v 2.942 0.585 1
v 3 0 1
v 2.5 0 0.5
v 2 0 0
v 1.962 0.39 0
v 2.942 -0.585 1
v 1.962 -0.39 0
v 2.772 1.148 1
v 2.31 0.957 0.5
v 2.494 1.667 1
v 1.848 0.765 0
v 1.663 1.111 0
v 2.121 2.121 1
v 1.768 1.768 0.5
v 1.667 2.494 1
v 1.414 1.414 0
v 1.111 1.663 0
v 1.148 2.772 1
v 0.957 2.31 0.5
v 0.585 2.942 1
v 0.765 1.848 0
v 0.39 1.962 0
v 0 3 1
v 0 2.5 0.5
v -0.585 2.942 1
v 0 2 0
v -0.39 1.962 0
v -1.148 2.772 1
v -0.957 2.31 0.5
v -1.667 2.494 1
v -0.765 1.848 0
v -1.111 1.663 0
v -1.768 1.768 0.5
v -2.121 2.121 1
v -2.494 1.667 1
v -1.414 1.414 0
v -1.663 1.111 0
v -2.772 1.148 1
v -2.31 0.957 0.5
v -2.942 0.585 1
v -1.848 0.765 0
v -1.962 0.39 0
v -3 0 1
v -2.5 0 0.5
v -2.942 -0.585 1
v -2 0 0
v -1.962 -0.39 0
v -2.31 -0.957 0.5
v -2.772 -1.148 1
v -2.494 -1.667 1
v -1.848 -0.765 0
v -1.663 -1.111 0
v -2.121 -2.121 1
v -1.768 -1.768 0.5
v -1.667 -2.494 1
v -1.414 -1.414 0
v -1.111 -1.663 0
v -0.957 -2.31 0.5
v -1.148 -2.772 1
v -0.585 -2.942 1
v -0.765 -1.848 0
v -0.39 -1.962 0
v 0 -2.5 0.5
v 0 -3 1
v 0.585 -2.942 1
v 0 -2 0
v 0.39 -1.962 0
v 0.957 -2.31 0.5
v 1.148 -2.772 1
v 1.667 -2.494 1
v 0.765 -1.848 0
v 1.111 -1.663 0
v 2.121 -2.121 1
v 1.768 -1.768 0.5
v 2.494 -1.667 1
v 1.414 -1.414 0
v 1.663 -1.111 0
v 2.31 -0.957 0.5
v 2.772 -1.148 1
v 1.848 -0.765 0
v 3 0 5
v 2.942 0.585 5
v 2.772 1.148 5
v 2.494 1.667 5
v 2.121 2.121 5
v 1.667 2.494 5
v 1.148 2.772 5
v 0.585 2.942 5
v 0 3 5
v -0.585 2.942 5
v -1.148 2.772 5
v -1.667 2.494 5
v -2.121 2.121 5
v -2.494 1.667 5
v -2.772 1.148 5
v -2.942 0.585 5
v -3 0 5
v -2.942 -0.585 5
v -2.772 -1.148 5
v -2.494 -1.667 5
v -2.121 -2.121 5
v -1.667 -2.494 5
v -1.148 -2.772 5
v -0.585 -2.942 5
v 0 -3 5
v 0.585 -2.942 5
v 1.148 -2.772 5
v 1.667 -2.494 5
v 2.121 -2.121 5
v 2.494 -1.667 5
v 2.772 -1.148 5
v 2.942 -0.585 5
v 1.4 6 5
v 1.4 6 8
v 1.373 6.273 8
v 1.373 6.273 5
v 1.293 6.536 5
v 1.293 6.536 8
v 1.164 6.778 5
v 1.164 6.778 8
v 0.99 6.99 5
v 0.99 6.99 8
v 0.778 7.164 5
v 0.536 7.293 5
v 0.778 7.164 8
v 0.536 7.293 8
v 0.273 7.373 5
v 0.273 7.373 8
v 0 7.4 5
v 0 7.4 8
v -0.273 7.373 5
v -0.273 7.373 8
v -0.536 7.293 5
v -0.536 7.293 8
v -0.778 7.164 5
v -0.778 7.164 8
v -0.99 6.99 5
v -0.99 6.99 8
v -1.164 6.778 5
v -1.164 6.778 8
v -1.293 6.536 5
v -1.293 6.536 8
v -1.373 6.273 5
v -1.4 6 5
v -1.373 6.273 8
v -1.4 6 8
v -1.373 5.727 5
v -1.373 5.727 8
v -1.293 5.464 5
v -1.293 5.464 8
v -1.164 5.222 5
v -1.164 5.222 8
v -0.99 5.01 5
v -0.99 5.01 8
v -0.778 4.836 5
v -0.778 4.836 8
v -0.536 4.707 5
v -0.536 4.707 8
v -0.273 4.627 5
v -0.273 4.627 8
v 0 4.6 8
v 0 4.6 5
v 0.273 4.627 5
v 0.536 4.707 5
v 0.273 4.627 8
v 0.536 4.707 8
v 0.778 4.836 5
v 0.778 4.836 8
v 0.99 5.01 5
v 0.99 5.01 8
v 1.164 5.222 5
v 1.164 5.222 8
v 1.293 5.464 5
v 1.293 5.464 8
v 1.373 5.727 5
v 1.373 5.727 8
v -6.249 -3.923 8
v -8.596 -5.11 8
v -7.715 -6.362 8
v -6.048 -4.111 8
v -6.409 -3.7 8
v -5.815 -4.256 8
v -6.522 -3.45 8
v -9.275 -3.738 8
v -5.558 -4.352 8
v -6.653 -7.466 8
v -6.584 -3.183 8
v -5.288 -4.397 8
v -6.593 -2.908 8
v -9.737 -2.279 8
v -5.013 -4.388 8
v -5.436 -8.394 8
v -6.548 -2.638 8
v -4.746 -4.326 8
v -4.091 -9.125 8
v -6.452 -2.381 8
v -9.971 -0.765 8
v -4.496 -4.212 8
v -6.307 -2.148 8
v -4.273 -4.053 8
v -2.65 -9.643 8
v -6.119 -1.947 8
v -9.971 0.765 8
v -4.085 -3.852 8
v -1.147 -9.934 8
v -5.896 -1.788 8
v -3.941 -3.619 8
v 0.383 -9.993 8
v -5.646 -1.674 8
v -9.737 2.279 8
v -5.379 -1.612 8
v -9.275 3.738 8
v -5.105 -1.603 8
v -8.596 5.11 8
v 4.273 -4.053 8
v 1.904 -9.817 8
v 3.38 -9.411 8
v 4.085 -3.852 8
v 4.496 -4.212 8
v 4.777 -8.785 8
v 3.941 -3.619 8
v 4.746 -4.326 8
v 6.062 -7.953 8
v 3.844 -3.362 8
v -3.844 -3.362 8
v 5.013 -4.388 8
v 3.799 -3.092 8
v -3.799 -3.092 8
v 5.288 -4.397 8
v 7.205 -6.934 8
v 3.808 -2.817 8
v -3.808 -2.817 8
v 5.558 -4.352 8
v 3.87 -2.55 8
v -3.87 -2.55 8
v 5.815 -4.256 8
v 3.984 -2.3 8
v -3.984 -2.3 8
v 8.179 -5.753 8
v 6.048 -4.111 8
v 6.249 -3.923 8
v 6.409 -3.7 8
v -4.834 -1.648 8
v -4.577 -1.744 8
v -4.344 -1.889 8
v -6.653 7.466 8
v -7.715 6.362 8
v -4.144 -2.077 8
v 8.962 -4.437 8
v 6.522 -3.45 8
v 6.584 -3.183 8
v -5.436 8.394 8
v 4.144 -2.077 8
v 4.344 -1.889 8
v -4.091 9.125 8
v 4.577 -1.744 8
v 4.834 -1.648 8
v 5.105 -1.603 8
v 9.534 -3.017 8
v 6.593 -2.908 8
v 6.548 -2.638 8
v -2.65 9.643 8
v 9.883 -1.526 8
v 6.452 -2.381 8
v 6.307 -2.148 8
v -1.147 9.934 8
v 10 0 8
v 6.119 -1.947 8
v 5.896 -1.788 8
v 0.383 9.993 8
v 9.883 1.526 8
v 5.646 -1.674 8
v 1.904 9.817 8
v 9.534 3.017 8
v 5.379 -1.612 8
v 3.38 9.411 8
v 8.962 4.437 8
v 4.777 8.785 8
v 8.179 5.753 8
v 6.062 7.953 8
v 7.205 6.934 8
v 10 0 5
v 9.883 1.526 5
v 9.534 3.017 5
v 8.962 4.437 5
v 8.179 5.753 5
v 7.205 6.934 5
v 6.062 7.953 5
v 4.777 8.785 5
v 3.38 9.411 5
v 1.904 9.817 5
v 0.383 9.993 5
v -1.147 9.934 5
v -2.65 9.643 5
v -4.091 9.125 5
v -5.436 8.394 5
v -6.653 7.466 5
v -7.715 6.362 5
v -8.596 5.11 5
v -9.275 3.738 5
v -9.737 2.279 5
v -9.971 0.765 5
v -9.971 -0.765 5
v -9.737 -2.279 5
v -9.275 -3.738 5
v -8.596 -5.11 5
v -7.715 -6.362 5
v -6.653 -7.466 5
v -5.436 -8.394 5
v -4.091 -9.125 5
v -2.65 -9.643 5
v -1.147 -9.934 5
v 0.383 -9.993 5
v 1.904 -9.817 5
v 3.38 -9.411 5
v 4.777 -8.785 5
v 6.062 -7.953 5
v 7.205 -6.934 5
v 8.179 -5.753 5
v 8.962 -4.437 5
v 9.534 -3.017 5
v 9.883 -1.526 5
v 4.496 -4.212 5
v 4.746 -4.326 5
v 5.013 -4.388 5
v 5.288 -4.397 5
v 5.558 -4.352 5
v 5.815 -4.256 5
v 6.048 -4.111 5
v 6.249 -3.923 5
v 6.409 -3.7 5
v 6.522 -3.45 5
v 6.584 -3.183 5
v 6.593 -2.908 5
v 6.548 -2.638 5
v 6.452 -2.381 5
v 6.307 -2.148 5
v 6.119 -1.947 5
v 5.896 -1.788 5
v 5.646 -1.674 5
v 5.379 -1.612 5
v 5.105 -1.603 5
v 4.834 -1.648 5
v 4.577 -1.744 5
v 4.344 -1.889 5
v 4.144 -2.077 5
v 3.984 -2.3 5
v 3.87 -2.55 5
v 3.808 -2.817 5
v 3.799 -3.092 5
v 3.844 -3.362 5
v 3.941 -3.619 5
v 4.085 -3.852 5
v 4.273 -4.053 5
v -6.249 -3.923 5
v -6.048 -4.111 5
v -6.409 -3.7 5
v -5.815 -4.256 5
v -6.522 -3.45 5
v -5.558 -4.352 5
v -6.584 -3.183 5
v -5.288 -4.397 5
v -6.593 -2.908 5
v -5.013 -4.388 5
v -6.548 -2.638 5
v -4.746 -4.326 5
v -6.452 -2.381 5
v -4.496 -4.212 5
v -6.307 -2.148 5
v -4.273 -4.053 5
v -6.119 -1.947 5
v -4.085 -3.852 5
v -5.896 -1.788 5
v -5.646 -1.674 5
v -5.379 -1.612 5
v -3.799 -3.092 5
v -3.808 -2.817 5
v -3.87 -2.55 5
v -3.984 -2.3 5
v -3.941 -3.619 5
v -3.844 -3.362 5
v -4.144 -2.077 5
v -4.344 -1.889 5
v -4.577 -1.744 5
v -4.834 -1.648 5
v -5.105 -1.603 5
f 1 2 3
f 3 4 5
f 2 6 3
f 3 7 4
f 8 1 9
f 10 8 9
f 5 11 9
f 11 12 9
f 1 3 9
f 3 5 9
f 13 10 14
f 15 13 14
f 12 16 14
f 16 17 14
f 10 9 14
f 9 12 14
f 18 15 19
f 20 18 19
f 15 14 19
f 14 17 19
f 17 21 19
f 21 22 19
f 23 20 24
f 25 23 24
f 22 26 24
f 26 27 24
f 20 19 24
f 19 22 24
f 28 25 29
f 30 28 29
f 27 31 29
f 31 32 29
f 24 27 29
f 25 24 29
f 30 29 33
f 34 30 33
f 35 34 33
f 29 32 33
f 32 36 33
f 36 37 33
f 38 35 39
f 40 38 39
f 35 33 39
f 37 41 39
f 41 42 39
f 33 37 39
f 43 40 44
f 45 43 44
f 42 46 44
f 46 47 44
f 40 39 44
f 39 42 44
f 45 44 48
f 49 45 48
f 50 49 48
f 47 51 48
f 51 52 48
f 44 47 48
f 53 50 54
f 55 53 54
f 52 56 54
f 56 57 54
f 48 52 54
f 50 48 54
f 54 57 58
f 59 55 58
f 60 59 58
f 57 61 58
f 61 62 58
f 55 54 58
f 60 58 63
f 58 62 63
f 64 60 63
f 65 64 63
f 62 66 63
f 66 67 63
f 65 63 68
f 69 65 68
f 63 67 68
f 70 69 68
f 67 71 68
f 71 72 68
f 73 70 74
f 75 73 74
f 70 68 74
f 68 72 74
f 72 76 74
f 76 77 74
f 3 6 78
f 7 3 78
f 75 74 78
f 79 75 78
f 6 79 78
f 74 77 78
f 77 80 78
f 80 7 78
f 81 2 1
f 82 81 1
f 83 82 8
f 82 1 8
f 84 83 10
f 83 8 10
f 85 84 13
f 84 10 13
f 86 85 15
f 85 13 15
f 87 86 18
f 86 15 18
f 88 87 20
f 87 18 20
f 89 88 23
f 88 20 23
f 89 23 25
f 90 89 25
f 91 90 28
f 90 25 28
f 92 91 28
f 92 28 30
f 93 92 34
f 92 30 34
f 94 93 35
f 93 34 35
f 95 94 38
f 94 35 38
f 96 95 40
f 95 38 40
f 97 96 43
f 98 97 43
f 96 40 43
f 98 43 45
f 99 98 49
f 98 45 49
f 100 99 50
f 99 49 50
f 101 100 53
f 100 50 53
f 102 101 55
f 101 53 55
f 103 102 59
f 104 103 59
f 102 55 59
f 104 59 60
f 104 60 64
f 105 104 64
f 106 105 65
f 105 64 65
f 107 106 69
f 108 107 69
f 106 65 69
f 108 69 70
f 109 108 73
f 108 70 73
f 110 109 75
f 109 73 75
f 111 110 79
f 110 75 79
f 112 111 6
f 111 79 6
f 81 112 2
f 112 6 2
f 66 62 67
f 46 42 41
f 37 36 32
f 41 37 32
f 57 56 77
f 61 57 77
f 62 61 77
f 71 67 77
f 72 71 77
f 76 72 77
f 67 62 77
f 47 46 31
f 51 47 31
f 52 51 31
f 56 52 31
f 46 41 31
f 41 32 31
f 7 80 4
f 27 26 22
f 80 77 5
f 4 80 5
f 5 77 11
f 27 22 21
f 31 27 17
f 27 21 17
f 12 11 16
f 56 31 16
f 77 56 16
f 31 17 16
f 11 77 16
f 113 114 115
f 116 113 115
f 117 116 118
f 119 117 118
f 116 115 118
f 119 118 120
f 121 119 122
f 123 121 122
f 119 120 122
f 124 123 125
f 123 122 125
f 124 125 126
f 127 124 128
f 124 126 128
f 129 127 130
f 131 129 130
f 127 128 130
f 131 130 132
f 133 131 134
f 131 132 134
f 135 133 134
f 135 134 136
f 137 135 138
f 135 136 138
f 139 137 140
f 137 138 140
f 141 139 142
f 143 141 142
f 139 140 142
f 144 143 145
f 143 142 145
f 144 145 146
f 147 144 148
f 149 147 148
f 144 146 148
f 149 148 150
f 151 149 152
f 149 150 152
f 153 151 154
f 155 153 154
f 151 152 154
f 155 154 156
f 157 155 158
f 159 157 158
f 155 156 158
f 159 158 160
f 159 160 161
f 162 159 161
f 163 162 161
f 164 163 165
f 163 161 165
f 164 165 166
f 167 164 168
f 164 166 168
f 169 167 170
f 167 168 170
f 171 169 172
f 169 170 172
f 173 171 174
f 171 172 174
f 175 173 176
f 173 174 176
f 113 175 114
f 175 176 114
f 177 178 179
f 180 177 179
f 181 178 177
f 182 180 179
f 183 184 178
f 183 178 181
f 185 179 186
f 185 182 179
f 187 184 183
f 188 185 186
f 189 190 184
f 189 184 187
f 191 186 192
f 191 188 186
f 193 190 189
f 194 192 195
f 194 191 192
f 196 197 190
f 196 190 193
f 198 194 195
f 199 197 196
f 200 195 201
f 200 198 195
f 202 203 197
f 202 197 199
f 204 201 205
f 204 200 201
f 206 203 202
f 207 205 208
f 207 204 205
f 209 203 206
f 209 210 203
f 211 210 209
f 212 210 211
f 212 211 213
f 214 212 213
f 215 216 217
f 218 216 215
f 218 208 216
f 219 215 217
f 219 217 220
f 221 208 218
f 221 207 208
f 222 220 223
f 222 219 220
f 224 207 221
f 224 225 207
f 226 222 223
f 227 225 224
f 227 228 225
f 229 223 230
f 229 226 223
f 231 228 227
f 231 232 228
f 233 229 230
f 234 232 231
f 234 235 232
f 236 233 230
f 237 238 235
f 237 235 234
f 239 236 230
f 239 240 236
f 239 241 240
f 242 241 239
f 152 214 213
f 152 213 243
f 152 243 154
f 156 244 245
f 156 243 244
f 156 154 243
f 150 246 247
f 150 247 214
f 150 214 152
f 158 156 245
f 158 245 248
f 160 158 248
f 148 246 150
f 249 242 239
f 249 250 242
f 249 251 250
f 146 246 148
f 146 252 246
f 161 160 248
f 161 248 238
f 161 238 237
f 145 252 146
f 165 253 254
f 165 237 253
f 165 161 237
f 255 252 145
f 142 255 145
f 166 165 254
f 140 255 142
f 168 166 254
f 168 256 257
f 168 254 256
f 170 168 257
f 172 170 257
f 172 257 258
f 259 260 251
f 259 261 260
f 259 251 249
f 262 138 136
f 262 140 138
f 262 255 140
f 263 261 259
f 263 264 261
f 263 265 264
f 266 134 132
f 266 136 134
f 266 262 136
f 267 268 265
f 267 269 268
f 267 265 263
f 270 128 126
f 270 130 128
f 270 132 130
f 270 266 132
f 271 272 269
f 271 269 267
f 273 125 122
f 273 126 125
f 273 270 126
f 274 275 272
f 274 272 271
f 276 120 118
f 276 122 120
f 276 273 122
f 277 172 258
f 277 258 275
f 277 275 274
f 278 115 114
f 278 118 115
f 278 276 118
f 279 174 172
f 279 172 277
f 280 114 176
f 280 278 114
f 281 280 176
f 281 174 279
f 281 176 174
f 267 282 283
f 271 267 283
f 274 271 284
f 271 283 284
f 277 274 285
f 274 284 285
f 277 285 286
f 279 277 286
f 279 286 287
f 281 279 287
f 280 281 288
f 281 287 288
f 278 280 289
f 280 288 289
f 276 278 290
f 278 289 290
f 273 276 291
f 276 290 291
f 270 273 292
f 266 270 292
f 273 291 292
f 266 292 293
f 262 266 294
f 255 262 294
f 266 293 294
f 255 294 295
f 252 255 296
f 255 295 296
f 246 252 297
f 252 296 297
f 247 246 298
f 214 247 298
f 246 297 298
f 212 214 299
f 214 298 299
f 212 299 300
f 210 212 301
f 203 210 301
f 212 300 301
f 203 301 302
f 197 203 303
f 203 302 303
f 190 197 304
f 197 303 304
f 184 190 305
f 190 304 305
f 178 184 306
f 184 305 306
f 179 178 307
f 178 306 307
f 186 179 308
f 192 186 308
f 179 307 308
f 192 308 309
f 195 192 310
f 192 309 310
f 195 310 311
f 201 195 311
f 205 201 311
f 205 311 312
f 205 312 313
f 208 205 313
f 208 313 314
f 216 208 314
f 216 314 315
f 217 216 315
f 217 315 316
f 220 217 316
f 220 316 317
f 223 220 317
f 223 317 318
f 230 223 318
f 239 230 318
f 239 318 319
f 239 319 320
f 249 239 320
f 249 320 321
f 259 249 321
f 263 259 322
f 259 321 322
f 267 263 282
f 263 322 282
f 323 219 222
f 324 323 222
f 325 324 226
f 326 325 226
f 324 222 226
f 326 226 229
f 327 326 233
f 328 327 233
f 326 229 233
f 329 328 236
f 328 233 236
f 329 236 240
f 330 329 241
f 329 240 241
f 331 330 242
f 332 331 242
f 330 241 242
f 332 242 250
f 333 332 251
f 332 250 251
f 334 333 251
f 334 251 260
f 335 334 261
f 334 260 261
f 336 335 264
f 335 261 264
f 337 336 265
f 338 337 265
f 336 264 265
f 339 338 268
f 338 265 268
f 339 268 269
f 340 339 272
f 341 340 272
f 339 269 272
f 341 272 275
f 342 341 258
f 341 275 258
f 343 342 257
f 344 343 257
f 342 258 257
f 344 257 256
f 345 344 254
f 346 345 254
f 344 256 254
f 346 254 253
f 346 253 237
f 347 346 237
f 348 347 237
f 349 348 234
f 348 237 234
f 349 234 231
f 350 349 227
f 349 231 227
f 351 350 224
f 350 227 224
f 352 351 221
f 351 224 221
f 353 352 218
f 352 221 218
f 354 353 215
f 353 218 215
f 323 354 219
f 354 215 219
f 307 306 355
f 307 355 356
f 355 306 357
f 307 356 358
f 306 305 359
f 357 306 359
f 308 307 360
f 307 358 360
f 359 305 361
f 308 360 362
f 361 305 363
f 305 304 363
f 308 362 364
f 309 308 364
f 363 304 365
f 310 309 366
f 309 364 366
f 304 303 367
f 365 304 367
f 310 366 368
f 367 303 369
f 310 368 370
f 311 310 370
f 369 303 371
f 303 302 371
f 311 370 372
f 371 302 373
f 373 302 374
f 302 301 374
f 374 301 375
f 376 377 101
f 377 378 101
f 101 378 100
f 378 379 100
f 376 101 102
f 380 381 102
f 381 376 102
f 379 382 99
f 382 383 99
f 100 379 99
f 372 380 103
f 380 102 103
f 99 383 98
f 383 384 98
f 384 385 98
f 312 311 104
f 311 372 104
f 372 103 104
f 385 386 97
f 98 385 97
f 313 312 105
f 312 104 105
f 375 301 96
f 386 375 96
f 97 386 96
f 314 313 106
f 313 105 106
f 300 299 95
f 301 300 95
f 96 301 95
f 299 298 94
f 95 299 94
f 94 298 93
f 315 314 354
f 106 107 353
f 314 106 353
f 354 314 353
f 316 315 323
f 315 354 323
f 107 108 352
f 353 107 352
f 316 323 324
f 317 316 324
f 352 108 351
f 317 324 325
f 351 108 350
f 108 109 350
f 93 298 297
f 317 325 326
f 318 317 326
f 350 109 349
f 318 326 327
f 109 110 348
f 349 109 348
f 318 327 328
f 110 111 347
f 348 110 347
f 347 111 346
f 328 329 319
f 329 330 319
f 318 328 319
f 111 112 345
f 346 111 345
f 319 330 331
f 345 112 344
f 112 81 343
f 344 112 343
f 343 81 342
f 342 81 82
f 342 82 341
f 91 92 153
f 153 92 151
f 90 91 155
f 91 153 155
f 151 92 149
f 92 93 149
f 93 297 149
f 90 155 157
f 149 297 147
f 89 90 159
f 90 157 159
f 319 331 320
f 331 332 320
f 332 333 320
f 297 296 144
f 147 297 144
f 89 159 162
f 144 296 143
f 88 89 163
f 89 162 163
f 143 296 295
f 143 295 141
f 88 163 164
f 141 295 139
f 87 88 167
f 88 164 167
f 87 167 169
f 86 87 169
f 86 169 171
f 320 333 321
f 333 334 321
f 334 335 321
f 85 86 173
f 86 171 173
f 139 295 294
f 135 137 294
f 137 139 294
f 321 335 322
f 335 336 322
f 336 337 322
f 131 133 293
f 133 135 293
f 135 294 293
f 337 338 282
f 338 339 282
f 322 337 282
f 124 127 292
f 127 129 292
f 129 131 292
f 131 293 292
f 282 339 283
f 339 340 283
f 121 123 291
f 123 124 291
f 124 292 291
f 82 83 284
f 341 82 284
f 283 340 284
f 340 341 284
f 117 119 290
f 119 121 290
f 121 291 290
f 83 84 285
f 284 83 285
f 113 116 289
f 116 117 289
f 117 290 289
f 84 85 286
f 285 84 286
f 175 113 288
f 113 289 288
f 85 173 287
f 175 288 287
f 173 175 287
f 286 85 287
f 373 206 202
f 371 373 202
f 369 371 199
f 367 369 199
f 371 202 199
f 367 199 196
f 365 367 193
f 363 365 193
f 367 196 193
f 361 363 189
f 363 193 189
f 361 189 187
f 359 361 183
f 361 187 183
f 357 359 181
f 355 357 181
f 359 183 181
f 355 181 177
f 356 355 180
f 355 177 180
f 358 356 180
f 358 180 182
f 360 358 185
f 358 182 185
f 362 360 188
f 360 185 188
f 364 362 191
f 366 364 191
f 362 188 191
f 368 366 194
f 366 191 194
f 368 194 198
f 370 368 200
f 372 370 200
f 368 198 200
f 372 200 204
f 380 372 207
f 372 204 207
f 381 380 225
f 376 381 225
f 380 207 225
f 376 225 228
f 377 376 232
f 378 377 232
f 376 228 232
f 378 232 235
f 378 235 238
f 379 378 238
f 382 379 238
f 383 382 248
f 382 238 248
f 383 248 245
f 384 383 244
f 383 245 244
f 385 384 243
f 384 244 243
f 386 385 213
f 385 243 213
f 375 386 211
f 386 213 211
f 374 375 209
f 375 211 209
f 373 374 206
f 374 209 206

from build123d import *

# Parameters (mm, degrees)
SKETCH1_R           = 3
BOSS_EXTRUDE1_DEPTH = 5
SKETCH2_R           = 10
BOSS_EXTRUDE2_DEPTH = 3
SKETCH3_R           = 1.4
CUT_EXTRUDE1_DEPTH  = 3
CIRPATTERN1_COUNT   = 3
CHAMFER1_SIZE       = 1


with BuildPart() as part:
    # Sketch1 → Boss-Extrude1 (new body)
    with BuildSketch(Plane.XY):
        Circle(SKETCH1_R)
    extrude(amount=BOSS_EXTRUDE1_DEPTH)

    # Sketch2 → Boss-Extrude2 (add)
    with BuildSketch(Plane.XY.offset(5)):
        Circle(SKETCH2_R)
    extrude(amount=BOSS_EXTRUDE2_DEPTH)

    # Sketch3 → Cut-Extrude1 (cut)
    with BuildSketch(Plane.XY.offset(8)):
        with Locations((0, 6)):
            Circle(SKETCH3_R)
    cut_extrude1 = extrude(amount=-CUT_EXTRUDE1_DEPTH, mode=Mode.SUBTRACT)

    # CirPattern1: Cut-Extrude1 ×3 about axis
    cirpattern1_axis = Axis((0, 0, 0), (0, 0, 1))
    for i in range(1, CIRPATTERN1_COUNT):
        add(cut_extrude1.rotate(cirpattern1_axis, i * 360 / CIRPATTERN1_COUNT), mode=Mode.SUBTRACT)

    # Chamfer1
    chamfer1_edges = [part.edges().sort_by_distance(p)[0] for p in [
        (-3, 0, 0),
    ]]
    chamfer(chamfer1_edges, length=CHAMFER1_SIZE)


solid = part.part
